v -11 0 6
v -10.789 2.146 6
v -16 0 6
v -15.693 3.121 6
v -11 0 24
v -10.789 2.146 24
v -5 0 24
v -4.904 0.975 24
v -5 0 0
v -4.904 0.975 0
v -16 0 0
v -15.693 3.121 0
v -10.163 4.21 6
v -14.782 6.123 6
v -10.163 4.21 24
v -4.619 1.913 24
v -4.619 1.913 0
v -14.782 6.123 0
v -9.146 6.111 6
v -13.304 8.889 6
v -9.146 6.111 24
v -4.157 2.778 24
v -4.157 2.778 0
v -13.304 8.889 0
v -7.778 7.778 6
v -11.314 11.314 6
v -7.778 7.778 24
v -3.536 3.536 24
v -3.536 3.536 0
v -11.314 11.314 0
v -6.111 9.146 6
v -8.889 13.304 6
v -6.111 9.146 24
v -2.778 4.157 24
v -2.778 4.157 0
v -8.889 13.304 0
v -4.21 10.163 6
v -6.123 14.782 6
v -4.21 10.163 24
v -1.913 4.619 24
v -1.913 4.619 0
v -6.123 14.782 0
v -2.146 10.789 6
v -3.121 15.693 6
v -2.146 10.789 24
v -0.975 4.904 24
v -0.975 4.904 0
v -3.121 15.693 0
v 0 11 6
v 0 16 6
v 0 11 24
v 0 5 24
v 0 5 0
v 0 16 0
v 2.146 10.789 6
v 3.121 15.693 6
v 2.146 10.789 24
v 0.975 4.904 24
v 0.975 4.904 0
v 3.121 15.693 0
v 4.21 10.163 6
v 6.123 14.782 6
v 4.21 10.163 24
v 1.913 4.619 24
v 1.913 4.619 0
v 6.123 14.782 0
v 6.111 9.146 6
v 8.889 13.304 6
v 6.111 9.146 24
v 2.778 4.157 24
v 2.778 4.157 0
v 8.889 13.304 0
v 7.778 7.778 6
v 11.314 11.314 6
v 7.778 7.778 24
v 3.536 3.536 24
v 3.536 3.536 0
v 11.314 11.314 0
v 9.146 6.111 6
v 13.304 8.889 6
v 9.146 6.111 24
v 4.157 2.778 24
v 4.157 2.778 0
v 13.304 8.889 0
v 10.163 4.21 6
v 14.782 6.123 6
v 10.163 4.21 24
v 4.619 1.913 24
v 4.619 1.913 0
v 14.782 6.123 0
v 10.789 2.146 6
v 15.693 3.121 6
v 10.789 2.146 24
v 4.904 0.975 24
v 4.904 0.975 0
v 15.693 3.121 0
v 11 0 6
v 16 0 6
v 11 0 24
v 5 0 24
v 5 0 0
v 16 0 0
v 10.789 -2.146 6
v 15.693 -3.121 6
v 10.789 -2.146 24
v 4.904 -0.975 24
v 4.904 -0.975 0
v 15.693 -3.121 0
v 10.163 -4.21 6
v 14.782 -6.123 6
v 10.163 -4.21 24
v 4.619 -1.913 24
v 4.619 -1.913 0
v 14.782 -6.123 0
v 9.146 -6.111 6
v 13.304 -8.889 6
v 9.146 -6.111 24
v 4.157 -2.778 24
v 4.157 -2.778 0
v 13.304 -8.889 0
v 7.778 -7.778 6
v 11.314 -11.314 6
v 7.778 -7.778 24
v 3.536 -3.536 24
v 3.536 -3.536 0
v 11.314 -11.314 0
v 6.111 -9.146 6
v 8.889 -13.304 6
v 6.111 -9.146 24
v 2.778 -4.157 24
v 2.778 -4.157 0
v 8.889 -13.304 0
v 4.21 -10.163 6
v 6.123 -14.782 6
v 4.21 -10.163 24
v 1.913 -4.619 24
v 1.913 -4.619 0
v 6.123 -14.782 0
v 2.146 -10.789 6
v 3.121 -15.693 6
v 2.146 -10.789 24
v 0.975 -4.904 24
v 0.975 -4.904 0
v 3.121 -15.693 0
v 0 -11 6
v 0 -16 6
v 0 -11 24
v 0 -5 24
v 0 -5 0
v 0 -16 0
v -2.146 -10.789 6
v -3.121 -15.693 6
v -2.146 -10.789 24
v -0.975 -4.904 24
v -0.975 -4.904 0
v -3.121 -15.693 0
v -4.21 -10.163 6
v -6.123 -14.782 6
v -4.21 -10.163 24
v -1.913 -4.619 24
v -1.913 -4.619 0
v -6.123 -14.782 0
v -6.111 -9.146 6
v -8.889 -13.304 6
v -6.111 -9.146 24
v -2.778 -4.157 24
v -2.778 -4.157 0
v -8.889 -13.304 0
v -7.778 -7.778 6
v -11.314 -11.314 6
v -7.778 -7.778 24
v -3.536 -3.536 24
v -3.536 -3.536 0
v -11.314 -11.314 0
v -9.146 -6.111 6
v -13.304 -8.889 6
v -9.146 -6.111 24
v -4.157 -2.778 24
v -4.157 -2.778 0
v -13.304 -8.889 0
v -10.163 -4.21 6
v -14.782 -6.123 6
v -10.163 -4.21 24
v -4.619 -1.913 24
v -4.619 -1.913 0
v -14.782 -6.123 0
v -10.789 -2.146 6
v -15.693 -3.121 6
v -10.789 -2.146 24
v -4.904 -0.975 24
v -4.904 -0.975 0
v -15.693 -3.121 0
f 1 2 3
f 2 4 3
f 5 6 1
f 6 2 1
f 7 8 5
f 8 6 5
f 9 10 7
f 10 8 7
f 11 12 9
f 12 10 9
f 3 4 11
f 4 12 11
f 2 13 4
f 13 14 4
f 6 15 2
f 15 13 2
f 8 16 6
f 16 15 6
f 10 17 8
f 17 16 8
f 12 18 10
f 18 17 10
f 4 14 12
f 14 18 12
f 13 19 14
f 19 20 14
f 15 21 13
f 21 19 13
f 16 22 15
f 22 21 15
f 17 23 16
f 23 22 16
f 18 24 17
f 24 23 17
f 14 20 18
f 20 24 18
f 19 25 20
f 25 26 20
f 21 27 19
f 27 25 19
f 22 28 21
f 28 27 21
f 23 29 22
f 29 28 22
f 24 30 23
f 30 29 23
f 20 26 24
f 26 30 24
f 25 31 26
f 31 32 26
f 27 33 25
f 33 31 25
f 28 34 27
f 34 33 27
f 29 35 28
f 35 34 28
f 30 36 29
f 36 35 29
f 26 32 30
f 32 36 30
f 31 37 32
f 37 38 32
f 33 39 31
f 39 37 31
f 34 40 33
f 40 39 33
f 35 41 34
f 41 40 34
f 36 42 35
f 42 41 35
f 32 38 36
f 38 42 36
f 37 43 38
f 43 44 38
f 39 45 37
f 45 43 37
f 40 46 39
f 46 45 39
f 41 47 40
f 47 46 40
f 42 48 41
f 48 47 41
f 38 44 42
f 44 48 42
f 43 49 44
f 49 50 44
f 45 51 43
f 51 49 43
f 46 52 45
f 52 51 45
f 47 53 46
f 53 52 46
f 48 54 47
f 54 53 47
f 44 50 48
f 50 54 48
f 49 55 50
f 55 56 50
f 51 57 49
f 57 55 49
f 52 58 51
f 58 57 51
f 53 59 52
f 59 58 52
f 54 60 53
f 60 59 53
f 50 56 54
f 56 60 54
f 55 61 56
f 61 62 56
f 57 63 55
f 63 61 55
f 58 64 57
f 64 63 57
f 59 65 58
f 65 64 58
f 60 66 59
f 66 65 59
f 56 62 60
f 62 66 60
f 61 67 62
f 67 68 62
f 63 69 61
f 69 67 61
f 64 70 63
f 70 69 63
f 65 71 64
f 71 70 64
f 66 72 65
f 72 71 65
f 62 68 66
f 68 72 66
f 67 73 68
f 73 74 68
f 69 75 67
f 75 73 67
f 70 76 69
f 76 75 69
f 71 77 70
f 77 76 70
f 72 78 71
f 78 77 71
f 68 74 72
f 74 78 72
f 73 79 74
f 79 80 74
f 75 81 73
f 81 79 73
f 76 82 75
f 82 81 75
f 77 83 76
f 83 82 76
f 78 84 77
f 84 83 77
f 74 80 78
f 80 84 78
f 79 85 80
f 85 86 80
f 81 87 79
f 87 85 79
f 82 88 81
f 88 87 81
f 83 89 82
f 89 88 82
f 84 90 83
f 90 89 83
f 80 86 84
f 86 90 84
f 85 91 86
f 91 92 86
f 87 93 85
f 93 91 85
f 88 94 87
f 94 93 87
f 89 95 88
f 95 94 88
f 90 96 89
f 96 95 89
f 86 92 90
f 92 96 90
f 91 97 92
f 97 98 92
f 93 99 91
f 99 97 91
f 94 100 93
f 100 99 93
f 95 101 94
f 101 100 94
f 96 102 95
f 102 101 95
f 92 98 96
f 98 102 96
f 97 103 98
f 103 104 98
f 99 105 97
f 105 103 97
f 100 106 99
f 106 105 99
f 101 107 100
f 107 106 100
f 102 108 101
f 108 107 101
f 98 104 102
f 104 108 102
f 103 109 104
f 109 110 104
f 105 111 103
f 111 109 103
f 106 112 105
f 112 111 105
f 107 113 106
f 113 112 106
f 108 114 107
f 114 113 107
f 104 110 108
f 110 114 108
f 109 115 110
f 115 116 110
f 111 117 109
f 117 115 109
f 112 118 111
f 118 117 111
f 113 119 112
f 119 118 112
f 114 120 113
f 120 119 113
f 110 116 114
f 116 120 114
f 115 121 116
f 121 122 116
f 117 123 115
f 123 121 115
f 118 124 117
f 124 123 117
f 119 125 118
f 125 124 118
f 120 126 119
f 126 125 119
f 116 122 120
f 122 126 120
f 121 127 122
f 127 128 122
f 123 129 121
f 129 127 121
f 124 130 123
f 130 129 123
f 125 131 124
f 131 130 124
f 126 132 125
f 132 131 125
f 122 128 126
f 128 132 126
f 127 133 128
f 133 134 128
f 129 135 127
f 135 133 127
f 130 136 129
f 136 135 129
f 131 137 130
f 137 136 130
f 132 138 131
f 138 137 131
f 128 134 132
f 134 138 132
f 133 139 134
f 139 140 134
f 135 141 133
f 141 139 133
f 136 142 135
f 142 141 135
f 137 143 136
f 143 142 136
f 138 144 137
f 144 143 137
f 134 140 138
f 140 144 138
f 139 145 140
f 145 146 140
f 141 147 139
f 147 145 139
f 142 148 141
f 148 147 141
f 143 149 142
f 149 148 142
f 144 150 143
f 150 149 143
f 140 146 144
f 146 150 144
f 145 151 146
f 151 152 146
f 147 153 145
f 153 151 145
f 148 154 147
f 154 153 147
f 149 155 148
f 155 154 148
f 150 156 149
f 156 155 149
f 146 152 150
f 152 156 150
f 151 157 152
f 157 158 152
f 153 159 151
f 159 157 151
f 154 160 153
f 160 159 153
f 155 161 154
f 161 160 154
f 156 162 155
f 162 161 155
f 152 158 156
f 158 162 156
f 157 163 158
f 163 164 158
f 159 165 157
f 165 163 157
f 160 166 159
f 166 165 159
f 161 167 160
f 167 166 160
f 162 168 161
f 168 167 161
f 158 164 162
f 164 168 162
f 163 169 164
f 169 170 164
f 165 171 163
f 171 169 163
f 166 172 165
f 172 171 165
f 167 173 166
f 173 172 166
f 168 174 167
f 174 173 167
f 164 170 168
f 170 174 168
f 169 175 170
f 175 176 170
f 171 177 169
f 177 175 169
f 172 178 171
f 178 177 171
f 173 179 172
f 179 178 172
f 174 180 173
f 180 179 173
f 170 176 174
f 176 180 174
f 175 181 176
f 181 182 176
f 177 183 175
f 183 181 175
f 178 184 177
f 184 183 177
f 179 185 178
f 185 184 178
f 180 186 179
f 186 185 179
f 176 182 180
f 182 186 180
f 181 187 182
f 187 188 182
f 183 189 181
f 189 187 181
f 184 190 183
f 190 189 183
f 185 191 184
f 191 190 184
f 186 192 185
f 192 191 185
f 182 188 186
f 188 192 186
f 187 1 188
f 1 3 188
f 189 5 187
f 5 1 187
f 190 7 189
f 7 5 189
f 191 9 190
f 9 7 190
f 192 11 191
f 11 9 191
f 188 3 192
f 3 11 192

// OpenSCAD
$fn = 32;

// ----------------------------------------------------------------------
// Arc stop: collar, 24 mm thick
// ----------------------------------------------------------------------

// --- parameters (mm) ---
revolve_angle = 360;      // full turn around the Z axis
profile_points = 6;       // points of the closed outline

profile = [[5, 0], [16, 0], [16, 6], [11, 6], [11, 24], [5, 24]];  // single closed polygon, 6 points, counter clockwise

// --- the one profile operation ---
rotate_extrude(angle = revolve_angle) polygon(points = profile);
